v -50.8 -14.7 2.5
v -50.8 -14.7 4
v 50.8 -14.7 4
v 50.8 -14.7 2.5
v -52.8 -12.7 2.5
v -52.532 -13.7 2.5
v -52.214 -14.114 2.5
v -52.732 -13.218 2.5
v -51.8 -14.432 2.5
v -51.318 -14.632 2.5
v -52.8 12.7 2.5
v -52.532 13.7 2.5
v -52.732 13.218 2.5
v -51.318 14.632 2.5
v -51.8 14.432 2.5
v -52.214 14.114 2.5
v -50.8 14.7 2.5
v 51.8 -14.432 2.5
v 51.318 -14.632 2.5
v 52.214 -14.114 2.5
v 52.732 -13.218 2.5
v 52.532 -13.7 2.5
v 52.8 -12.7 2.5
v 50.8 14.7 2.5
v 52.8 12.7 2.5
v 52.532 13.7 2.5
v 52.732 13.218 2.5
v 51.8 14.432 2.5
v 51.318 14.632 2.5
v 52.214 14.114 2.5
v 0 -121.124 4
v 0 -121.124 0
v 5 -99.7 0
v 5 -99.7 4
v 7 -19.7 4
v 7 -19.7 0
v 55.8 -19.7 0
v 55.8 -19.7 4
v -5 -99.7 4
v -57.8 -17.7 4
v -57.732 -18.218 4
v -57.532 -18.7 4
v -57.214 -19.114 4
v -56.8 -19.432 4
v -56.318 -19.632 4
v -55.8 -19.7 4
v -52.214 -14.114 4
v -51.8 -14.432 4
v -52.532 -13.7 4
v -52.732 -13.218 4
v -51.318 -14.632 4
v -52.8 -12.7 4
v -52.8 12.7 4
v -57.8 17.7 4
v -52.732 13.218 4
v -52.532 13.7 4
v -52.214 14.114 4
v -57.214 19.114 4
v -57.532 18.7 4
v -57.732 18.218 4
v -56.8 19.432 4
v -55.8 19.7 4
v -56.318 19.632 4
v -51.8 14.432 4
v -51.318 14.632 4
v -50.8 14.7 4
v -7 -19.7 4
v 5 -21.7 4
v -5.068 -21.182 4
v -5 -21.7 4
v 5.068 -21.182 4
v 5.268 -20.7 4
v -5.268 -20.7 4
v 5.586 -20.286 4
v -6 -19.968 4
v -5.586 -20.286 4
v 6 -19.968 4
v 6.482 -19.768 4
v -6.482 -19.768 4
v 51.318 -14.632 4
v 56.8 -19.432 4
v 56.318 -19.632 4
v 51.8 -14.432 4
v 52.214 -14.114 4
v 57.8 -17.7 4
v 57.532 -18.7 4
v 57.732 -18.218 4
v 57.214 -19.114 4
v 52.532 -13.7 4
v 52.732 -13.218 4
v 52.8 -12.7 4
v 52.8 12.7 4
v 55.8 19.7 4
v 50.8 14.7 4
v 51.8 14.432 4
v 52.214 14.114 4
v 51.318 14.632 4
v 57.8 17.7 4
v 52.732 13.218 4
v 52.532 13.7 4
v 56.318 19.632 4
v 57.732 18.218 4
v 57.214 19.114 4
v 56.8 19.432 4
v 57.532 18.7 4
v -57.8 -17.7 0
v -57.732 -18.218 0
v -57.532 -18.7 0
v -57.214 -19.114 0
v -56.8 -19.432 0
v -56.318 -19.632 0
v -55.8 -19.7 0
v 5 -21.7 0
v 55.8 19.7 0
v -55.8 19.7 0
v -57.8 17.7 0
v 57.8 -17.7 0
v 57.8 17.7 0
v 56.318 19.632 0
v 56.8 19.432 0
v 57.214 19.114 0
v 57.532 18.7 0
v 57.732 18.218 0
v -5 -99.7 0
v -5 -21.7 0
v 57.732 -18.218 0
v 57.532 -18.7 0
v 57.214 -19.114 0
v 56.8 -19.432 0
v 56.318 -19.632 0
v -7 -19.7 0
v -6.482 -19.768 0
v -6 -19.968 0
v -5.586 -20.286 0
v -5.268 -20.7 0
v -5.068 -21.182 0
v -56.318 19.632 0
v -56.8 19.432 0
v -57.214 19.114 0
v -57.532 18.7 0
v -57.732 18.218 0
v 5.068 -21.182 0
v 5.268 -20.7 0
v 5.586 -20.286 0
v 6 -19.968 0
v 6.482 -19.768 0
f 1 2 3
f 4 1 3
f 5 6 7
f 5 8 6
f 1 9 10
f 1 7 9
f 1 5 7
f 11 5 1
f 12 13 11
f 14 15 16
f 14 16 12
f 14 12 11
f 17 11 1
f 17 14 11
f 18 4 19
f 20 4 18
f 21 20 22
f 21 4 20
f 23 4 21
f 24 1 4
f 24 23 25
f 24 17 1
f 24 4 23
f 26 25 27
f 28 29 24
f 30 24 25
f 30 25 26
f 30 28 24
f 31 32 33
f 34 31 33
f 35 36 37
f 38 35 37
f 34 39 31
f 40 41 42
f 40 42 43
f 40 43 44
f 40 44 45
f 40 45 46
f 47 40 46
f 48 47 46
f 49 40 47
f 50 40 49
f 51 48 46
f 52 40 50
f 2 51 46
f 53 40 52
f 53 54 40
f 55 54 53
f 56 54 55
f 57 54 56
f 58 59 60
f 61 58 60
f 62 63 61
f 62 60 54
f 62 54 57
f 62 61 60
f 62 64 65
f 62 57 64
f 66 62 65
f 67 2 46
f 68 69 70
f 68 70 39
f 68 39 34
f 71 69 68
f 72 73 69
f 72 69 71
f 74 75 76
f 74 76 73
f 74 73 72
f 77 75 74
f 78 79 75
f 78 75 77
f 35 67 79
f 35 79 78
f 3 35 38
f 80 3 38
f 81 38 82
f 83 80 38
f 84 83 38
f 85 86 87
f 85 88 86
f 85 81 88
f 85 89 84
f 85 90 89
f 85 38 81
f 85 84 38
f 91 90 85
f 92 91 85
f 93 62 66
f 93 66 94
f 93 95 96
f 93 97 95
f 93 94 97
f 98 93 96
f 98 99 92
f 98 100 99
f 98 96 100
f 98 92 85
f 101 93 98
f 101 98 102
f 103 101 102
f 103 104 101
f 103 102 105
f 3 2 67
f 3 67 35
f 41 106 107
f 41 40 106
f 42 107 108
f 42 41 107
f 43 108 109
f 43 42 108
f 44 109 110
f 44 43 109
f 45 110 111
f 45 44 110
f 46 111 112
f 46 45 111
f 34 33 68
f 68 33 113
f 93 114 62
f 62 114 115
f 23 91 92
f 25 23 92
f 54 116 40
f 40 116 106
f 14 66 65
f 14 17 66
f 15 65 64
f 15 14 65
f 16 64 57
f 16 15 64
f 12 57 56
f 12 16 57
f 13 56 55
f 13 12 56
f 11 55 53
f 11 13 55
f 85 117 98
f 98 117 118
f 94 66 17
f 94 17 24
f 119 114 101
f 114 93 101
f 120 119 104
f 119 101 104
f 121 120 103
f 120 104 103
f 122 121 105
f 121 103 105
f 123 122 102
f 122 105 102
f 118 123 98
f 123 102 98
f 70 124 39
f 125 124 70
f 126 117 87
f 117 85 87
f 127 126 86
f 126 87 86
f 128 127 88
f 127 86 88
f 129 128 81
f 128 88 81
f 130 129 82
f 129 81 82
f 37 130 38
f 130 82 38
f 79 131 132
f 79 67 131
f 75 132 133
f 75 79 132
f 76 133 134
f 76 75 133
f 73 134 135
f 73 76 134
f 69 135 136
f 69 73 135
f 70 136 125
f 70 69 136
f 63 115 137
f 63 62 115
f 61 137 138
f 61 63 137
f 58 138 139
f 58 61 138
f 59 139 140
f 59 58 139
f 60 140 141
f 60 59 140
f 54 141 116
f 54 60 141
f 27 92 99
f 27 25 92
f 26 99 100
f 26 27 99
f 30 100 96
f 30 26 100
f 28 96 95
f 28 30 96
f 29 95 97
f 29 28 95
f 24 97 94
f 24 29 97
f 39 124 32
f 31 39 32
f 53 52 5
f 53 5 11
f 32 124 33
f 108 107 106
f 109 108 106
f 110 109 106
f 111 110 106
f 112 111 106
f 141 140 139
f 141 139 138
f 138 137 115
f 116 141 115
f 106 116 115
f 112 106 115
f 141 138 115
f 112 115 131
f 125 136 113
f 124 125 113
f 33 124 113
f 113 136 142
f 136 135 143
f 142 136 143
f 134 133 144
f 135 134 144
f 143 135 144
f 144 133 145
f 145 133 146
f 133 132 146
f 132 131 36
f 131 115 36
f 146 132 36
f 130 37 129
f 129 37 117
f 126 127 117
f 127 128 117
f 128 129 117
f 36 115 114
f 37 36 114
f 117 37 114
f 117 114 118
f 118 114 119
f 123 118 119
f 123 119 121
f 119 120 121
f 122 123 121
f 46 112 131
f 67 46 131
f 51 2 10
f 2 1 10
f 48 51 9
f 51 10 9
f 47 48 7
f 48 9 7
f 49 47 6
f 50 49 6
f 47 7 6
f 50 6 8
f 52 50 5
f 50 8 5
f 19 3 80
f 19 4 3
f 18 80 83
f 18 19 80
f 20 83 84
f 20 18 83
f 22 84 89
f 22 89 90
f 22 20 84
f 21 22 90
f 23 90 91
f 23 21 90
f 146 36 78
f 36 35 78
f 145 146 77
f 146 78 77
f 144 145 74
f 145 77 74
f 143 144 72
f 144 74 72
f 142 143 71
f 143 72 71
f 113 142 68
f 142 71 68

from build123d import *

# Parameters (mm, degrees)
F0_W     = 105.6
F0_H     = 29.4
F0_W_2   = 10
F0_H_2   = 80
F1_DEPTH = 4
F2_W     = 105.6
F2_H     = 29.4
F3_DEPTH = 1.5
F4_R     = 2


with BuildPart() as f1:
    # F0 (on Top) → F1 (new body)
    with BuildSketch(Plane.XY):
        Polygon((57.8, 19.7), (-57.8, 19.7), (-57.8, -19.7), (-5, -19.7), (5, -19.7), (57.8, -19.7), align=None)
        Rectangle(F0_W, F0_H, mode=Mode.SUBTRACT)
        Rectangle(F0_W, F0_H)
        with Locations((0, -59.7)):
            Rectangle(F0_W_2, F0_H_2)
        Polygon((5, -99.7), (-5, -99.7), (0, -121.124285), align=None)
    extrude(amount=F1_DEPTH)

    # F2 (on face) → F3 (cut)
    with BuildSketch(Plane.XY.offset(4)):
        Rectangle(F2_W, F2_H)
    extrude(amount=-F3_DEPTH, mode=Mode.SUBTRACT)

    # F4
    f4_edges = [f1.edges().sort_by_distance(p)[0] for p in [
        (-57.8, 19.7, 2),
        (-57.8, -19.7, 2),
        (57.8, -19.7, 2),
        (57.8, 19.7, 2),
        (52.8, 14.7, 3.25),
        (-52.8, 14.7, 3.25),
        (-52.8, -14.7, 3.25),
        (52.8, -14.7, 3.25),
        (5, -19.7, 2),
        (-5, -19.7, 2),
    ]]
    fillet(f4_edges, radius=F4_R)


solid = f1.part
